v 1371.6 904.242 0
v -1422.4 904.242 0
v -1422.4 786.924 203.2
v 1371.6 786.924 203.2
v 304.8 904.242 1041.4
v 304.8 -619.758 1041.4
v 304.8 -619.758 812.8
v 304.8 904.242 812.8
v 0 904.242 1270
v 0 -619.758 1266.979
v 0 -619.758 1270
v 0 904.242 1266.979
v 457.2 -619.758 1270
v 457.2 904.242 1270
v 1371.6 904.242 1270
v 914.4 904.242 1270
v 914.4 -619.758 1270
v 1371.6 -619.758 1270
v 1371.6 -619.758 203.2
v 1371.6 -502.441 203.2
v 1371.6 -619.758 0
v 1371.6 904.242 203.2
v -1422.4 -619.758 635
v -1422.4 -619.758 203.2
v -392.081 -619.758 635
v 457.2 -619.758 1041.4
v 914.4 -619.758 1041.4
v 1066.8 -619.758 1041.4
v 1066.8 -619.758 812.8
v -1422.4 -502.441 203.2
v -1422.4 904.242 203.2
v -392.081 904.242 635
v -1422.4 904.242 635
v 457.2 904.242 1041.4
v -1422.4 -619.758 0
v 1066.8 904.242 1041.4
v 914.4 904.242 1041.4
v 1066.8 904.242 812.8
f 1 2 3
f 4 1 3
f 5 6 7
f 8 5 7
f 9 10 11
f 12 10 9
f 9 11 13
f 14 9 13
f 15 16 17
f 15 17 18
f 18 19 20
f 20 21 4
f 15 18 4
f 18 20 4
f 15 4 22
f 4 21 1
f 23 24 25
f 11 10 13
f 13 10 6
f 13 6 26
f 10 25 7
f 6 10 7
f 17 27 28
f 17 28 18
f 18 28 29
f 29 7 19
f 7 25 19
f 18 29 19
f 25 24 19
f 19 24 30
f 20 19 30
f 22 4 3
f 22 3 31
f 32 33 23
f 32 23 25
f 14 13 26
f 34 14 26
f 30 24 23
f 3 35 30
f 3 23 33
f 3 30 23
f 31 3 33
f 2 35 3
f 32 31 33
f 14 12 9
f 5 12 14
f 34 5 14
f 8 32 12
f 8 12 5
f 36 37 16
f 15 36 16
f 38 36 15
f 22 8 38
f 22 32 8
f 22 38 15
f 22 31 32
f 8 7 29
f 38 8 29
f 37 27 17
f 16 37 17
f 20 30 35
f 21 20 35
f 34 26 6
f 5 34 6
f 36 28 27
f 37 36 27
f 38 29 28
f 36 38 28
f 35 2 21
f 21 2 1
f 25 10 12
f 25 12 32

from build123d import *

# Parameters (mm, degrees)
F0_W      = 1030.319246
F0_H      = 1524
F1_DEPTH  = 635
F0_W_2    = 457.2
F2_DEPTH  = 1270
F0_W_3    = 392.080754
F3_DEPTH  = 635
F5_DEPTH  = 1524
F8_DEPTH  = 2794.001
F9_DEPTH  = 2794.001
F11_DEPTH = 1524.001


with BuildPart() as f1:
    # F0 (on Top) → F1 (new body)
    with BuildSketch(Plane.XY):
        with Locations((-907.240377, 142.241771)):
            Rectangle(F0_W, F0_H)
    extrude(amount=F1_DEPTH)


with BuildPart() as f2:
    # F0 (on Top) → F2 (new body)
    with BuildSketch(Plane.XY):
        with Locations((228.6, 142.241771)):
            Rectangle(F0_W_2, F0_H)
        with Locations((685.8, 142.241771)):
            Rectangle(F0_W_2, F0_H)
        with Locations((1143, 142.241771)):
            Rectangle(F0_W_2, F0_H)
    extrude(amount=F2_DEPTH)


with BuildPart() as f3:
    # F0 (on Top) → F3 (new body)
    with BuildSketch(Plane.XY):
        with Locations((-196.040377, 142.241771)):
            Rectangle(F0_W_3, F0_H)
    extrude(amount=F3_DEPTH)


with BuildPart() as f5:
    # F4 (on face) → F5 (new body)
    with BuildSketch(Plane.XZ.offset(619.758229)):
        Polygon((0, 1266.978741), (-392.080754, 635), (0, 635), align=None)
    extrude(amount=-F5_DEPTH)


with BuildPart() as f2_1:
    add(f2.part)

    # F7: union F5, F3, F1
    add(f5.part)
    add(f3.part)
    add(f1.part)

    # F6 (on face) → F8 (cut, through all)
    with BuildSketch(Plane(origin=(-1422.4, 0, 0), x_dir=(0, -1, 0), z_dir=(-1, 0, 0))):
        Polygon((502.440655, 203.2), (619.758229, 0), (619.758229, 203.2), align=None)
    extrude(amount=-F8_DEPTH, mode=Mode.SUBTRACT)

    # F6 (on face) → F9 (cut, through all)
    with BuildSketch(Plane(origin=(-1422.4, 0, 0), x_dir=(0, -1, 0), z_dir=(-1, 0, 0))):
        Polygon((-904.241771, 203.2), (-904.241771, 0), (-786.924196, 203.2), align=None)
    extrude(amount=-F9_DEPTH, mode=Mode.SUBTRACT)

    # F10 (on face) → F11 (cut, through all)
    with BuildSketch(Plane.XZ.offset(619.758229)):
        Polygon((914.4, 1041.4), (914.4, 1270), (457.2, 1270), (457.2, 1041.4), (304.8, 1041.4), (304.8, 812.8), (1066.8, 812.8), (1066.8, 1041.4), align=None)
    extrude(amount=-F11_DEPTH, mode=Mode.SUBTRACT)


solid = f2_1.part
